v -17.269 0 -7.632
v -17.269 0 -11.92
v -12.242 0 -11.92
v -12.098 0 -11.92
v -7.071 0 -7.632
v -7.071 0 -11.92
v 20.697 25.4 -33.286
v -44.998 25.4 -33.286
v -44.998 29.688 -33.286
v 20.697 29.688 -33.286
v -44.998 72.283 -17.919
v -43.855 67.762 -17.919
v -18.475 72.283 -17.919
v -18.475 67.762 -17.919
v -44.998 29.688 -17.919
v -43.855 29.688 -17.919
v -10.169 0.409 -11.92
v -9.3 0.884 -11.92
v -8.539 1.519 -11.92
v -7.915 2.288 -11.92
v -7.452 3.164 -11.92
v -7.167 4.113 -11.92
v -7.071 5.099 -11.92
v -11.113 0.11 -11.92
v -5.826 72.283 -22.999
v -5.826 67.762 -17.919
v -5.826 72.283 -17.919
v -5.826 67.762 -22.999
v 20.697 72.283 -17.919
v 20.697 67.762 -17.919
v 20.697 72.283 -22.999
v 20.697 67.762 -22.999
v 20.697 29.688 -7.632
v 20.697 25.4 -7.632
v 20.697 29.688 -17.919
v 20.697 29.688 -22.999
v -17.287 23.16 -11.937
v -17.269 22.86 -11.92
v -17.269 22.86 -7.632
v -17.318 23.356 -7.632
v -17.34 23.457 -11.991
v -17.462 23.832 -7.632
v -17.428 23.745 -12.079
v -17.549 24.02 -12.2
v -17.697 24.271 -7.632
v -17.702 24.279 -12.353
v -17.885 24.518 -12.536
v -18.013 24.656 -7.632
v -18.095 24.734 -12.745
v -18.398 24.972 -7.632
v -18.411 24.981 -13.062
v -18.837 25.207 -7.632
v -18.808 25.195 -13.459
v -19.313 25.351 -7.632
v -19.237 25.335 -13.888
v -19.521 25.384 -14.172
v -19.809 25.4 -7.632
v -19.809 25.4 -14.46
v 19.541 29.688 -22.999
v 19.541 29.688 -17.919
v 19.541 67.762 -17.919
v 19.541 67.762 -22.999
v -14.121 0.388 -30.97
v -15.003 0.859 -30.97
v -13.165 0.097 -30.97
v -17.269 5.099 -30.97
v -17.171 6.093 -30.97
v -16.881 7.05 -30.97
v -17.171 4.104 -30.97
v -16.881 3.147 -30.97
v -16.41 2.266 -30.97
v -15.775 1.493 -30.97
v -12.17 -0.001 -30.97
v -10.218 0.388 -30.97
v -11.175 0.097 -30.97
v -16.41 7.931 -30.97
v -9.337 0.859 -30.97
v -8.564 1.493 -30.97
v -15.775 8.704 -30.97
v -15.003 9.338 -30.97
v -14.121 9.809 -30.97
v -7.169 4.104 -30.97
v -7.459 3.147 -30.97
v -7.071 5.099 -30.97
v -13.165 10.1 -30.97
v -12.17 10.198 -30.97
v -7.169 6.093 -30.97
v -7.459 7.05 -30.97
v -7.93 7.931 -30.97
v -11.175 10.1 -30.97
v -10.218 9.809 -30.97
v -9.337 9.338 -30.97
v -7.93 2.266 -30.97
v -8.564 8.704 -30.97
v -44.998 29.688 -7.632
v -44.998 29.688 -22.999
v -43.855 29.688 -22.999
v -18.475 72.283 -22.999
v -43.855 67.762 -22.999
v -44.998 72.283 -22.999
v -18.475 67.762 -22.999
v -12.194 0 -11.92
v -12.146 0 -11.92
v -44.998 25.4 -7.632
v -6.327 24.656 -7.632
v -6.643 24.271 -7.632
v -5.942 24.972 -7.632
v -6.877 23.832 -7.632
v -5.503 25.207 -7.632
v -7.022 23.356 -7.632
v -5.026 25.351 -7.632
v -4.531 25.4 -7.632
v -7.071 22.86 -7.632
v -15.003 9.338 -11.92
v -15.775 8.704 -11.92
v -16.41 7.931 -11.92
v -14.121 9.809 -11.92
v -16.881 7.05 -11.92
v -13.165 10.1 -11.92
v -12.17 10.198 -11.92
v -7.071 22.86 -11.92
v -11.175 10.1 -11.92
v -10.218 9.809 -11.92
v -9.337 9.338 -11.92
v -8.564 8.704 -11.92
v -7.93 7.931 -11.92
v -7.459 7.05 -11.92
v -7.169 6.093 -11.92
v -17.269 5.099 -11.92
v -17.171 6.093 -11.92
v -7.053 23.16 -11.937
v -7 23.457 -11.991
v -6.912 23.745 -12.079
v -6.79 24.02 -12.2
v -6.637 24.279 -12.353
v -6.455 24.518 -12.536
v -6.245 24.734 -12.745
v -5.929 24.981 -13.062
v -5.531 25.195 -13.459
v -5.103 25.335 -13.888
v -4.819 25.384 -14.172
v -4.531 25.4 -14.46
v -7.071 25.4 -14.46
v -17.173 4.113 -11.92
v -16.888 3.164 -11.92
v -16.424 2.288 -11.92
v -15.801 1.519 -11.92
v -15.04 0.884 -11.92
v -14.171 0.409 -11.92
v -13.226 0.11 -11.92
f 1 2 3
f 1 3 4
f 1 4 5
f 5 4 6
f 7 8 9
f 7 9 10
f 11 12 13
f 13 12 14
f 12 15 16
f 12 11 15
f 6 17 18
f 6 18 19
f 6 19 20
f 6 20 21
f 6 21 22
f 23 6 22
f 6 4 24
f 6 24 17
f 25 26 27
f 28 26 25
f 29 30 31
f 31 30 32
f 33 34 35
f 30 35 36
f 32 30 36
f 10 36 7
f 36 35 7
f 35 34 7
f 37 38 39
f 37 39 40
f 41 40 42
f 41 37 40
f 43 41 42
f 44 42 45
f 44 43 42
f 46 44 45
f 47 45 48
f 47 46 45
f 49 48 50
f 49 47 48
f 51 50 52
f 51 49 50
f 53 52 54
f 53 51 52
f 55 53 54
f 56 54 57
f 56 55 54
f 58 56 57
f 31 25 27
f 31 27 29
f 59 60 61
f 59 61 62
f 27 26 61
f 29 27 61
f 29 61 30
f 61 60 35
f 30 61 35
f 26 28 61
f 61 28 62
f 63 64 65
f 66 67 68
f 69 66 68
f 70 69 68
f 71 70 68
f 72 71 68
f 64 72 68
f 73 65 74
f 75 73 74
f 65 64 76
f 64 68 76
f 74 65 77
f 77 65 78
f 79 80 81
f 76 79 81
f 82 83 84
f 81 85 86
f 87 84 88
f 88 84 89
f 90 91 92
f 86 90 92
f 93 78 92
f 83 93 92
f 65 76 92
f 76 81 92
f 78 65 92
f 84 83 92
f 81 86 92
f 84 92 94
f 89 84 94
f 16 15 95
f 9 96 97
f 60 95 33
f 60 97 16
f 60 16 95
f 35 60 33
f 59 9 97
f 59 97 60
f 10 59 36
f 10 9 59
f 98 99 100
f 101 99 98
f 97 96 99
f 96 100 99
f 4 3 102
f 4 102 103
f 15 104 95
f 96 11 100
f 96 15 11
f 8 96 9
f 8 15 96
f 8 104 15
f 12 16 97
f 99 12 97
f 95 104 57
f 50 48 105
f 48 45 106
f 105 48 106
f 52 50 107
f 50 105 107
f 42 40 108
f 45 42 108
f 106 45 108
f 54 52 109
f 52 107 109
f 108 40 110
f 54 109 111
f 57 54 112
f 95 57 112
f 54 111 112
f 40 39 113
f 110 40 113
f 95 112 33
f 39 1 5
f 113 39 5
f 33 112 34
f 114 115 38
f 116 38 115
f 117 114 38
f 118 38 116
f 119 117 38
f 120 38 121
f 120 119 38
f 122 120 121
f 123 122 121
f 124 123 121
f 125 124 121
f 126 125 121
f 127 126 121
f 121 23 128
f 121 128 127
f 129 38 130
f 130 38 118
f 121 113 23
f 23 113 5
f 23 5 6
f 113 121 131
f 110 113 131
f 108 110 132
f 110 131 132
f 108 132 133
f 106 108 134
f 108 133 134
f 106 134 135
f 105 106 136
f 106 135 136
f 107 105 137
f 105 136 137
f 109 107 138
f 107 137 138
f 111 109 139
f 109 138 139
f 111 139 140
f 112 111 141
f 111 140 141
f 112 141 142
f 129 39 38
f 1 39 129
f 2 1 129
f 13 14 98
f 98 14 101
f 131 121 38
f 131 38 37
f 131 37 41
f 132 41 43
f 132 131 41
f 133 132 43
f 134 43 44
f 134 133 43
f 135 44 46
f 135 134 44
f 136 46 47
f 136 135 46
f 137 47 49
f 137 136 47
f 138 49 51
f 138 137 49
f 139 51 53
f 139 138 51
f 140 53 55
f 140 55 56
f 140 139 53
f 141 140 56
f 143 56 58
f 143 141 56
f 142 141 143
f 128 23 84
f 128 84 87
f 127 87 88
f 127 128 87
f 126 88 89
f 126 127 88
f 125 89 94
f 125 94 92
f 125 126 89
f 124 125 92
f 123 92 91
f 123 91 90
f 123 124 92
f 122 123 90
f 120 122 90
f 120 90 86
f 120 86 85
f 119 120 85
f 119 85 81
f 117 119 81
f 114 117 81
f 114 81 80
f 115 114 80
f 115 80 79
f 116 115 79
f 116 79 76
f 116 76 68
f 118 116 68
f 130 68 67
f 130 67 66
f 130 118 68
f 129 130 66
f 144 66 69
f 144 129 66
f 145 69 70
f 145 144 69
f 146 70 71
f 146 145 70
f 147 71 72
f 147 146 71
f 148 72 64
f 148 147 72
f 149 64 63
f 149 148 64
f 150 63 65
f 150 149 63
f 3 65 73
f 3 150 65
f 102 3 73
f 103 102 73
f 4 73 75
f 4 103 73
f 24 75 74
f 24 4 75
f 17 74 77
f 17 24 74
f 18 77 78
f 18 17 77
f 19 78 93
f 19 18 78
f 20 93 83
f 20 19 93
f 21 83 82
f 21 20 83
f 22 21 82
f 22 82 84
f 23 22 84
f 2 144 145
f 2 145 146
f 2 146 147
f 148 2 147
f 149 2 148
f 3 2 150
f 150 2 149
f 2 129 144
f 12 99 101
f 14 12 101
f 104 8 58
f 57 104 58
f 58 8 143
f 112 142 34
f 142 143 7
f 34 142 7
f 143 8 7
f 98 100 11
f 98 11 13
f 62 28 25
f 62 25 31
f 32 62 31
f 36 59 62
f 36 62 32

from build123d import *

# Parameters (mm, degrees)
SKETCH6_W            = 10.1981
SKETCH6_H            = 4.28752
BOSS_EXTRUDE3_DEPTH  = 25.4
SKETCH8_R            = 5.09905
BOSS_EXTRUDE5_DEPTH  = 19.05
SKETCH11_W           = 65.69456
SKETCH11_H           = 25.654
BOSS_EXTRUDE10_DEPTH = 4.28752
SKETCH16_W           = 1.143
SKETCH16_H           = 5.08
SKETCH16_W_2         = 1.155076163
BOSS_EXTRUDE11_DEPTH = 38.0746
SKETCH17_W           = 26.52268
SKETCH17_H           = 5.08
BOSS_EXTRUDE12_DEPTH = 4.5212
FILLET2_R            = 2.54
FILLET3_R            = 2.54
FILLET4_R            = 2.54


with BuildPart() as part:
    # Sketch6 → Boss-Extrude3 (new body)
    with BuildSketch(Plane(origin=(0, 0, 0), x_dir=(1, 0, 0), z_dir=(0, 1, 0))):
        with Locations((-12.169797761, 9.77580804)):
            Rectangle(SKETCH6_W, SKETCH6_H)
    extrude(amount=BOSS_EXTRUDE3_DEPTH)

    # Sketch8 → Boss-Extrude5 (add)
    with BuildSketch(Plane.XY.offset(-11.91956804)):
        with Locations((-12.169797761, 5.098542)):
            Circle(SKETCH8_R)
    extrude(amount=-BOSS_EXTRUDE5_DEPTH)

    # Sketch11 → Boss-Extrude10 (add)
    with BuildSketch(Plane(origin=(0, 25.4, 0), x_dir=(1, 0, 0), z_dir=(0, 1, 0))):
        with Locations((-12.150747761, 20.45904804)):
            Rectangle(SKETCH11_W, SKETCH11_H)
    extrude(amount=BOSS_EXTRUDE10_DEPTH)

    # Sketch16 → Boss-Extrude11 (add)
    with BuildSketch(Plane(origin=(0, 29.68752, 0), x_dir=(1, 0, 0), z_dir=(0, 1, 0))):
        with Locations((-44.426527761, 20.45904804)):
            Rectangle(SKETCH16_W, SKETCH16_H)
        with Locations((20.118994158, 20.45904804)):
            Rectangle(SKETCH16_W_2, SKETCH16_H)
    extrude(amount=BOSS_EXTRUDE11_DEPTH)

    # Sketch17 → Boss-Extrude12 (add)
    with BuildSketch(Plane(origin=(0, 67.76212, 0), x_dir=(1, 0, 0), z_dir=(0, 1, 0))):
        with Locations((-31.736687761, 20.45904804)):
            Rectangle(SKETCH17_W, SKETCH17_H)
        with Locations((7.435192239, 20.45904804)):
            Rectangle(SKETCH17_W, SKETCH17_H)
    extrude(amount=BOSS_EXTRUDE12_DEPTH)

    # Fillet2
    fillet2_edges = [part.edges().sort_by_distance(p)[0] for p in [
        (-12.169797761, 25.4, -11.91956804),
    ]]
    fillet(fillet2_edges, radius=FILLET2_R)

    # Fillet3
    fillet3_edges = [part.edges().sort_by_distance(p)[0] for p in [
        (-17.268847761, 25.4, -11.04580804),
    ]]
    fillet(fillet3_edges, radius=FILLET3_R)

    # Fillet4
    fillet4_edges = [part.edges().sort_by_distance(p)[0] for p in [
        (-7.070747761, 25.4, -11.04580804),
    ]]
    fillet(fillet4_edges, radius=FILLET4_R)


solid = part.part
